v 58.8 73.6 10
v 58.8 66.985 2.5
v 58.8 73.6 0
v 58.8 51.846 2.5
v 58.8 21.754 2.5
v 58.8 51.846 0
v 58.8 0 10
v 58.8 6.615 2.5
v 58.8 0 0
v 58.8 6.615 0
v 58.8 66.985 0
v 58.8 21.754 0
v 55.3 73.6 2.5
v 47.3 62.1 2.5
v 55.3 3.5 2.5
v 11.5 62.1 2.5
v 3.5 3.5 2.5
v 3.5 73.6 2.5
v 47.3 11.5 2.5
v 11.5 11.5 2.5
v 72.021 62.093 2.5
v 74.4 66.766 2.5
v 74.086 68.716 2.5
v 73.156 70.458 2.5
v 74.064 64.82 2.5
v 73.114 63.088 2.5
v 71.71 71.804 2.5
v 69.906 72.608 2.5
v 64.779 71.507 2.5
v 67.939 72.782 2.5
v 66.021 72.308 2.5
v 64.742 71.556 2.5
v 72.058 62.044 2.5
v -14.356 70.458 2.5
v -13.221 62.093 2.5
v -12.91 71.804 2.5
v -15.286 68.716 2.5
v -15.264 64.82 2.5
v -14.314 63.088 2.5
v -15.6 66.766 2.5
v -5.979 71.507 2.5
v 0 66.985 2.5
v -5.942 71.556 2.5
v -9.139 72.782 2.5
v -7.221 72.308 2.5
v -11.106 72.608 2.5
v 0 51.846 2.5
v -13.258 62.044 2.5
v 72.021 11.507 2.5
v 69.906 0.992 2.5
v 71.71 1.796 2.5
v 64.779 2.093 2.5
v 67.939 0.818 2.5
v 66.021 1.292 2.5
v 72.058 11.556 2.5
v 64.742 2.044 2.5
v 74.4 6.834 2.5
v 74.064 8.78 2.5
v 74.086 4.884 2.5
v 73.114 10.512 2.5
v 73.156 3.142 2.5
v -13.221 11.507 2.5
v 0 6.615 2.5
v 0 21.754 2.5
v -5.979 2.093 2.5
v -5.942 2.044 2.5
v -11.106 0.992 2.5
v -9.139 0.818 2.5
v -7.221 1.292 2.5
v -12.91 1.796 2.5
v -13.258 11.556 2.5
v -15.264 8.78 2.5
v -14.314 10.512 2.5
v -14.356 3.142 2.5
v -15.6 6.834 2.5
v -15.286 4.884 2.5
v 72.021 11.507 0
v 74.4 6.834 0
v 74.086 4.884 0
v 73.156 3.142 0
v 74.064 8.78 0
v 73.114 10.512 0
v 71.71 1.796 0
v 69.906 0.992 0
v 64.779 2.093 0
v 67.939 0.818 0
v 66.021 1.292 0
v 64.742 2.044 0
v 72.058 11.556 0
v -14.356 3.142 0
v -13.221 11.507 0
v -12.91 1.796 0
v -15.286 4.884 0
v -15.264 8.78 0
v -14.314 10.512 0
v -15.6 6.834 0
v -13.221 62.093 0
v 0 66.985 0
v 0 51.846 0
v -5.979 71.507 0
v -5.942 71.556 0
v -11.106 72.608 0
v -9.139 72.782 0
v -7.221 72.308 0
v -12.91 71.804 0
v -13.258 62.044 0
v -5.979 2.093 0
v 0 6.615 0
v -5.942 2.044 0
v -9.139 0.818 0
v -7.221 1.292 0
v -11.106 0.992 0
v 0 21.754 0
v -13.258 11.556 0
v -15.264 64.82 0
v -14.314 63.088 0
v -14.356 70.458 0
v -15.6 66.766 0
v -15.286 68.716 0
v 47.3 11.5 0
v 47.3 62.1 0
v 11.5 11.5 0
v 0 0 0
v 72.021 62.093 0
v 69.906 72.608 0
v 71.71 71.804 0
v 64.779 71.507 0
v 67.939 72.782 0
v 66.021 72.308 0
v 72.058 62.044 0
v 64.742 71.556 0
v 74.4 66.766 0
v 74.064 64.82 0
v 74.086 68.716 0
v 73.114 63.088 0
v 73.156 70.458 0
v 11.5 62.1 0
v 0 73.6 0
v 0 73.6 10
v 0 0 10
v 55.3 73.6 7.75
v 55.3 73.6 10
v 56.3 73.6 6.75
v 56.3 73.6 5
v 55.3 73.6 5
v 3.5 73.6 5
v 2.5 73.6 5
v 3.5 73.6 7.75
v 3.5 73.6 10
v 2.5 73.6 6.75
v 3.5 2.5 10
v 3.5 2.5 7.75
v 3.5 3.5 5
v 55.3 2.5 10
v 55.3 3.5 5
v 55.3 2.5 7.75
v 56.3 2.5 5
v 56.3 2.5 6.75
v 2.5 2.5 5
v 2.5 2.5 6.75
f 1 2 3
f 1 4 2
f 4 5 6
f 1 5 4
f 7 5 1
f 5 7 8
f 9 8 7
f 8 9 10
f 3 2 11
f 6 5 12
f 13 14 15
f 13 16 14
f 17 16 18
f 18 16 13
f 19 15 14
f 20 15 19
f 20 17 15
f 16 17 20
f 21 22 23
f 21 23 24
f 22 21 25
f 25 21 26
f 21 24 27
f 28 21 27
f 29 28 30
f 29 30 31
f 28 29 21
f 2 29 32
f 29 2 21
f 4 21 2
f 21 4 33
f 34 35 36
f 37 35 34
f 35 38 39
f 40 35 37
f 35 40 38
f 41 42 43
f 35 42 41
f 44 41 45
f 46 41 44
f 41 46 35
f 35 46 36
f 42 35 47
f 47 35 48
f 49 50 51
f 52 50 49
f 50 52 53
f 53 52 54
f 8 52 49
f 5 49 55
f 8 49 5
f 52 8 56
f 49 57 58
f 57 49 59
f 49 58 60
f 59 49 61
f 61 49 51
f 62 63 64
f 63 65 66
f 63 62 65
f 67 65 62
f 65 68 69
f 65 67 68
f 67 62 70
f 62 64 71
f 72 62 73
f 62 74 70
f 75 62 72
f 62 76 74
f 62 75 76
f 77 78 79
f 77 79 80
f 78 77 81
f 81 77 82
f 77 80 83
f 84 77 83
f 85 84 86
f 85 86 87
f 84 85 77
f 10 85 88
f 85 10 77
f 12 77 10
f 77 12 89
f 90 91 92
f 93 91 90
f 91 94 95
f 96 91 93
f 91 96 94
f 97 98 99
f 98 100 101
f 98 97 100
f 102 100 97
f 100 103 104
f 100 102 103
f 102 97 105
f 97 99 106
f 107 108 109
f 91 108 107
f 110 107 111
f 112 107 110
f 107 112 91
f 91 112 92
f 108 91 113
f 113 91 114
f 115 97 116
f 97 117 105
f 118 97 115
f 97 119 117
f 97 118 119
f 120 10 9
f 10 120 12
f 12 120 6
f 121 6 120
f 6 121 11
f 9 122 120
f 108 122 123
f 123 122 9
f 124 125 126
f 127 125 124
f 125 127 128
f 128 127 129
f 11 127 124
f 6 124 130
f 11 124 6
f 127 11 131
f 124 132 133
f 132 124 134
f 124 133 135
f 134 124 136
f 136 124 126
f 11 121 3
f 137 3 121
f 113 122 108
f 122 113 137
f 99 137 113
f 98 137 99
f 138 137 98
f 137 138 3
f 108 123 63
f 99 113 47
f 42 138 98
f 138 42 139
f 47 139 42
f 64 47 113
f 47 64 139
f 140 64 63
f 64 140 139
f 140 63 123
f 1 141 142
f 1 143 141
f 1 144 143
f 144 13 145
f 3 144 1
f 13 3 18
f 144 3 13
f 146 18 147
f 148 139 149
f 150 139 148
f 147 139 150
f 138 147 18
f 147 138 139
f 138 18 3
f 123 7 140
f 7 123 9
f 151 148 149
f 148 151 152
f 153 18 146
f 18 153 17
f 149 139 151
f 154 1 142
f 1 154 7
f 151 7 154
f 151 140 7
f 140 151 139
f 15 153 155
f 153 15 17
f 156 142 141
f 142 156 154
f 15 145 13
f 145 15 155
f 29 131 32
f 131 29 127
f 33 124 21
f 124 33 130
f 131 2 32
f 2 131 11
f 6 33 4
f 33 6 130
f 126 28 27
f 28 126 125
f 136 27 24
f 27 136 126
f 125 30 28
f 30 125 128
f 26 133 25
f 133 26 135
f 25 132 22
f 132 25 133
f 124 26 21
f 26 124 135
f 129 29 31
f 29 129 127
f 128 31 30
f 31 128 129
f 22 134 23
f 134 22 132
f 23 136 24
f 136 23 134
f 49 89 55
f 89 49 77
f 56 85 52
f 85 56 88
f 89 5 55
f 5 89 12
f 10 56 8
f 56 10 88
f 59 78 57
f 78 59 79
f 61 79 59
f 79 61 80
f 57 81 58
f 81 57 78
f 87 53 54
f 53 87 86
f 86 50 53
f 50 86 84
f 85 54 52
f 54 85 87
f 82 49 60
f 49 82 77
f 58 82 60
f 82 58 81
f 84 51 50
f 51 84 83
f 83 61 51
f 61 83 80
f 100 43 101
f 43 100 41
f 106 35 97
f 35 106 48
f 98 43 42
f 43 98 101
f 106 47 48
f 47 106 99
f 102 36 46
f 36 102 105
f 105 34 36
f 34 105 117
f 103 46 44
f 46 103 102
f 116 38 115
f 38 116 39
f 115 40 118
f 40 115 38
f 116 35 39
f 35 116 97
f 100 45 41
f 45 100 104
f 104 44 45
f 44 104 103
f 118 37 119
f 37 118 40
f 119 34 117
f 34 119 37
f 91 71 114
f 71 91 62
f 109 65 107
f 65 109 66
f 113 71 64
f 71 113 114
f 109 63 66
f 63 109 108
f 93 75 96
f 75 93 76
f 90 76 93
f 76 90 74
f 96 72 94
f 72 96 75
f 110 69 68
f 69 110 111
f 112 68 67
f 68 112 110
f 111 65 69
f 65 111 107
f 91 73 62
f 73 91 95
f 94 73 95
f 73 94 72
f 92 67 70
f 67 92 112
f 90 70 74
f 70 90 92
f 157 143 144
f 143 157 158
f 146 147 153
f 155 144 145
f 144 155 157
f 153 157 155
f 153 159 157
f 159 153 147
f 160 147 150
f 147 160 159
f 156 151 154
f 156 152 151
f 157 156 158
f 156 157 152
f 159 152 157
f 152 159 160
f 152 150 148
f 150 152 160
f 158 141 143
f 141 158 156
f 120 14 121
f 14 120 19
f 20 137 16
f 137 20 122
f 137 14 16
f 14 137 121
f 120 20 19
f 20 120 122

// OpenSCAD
/* pcb_box_slide_with_tabs.scad
 * By Nicholas C Lewis - Jan 1, 2011
 * http://www.thingiverse.com/thing:5396 
 *
 * derived from pcb_box_slide.scad 
 *     Parametric, open PCB-box (slide-in) by chlunde
 *     http://www.thingiverse.com/thing:4071
 *
 * CHANGES
 * - adjusted to fit Arduino Mega
 * - added mounting tabs
 * - turned off cutouts
 * - adjusted bottom cutout size
 */

// Makergear Makerbot Stepper Driver is 57 x 57
// Round up to 57.5 x 57.5
pcb_width = 53.8;
pcb_length =68.6;
pcb_height =1.75;
slisse = 1;

pcb_bottom_margin = 2.5;
wall_width_thick = 3.5;
wall_width = wall_width_thick-slisse;
box_height = 10;

// Tab and Mounting Parameters
tab_hole_radius=0;
tab_outer_radius=12/2;
tab_mount_width = 78;		// X - center to center of mounting hole
tab_mount_length = 60;		// Y - center to center of mounting hole



module tab() {
	difference(){
		union() {
			translate([-tab_outer_radius,-tab_outer_radius,0])
			cube([tab_outer_radius,2*tab_outer_radius,wall_width]);
			translate([-tab_outer_radius,0,0])
				cylinder(r=tab_outer_radius, h = wall_width);
		}
		translate([-tab_outer_radius,0,0])
		cylinder(r= tab_hole_radius, h = wall_width+3,center=true);
	}

}

module JDtab(X, Y) {
	rotate(atan(Y / X), [0,0,1])
	difference(){
		union() {
			translate([0,-tab_outer_radius,0])
			cube([sqrt(X*X+Y*Y),2*tab_outer_radius,wall_width]);
			translate([sqrt(X*X+Y*Y),0,0])
				cylinder(r=tab_outer_radius, h = wall_width);
		}
		translate([sqrt(X*X+Y*Y),0,0])
		cylinder(r= tab_hole_radius, h = wall_width+3,center=true);
	}

}

module box() {
  union() {
    cube([pcb_width + 2*wall_width, pcb_length + 2*wall_width, wall_width]);

    cube([wall_width_thick, pcb_length + 2*wall_width, box_height]);

    cube([pcb_width + 2*wall_width, wall_width_thick, box_height]);

    %translate([0, pcb_length+wall_width, 0])
      cube([pcb_width + 2*wall_width,wall_width,box_height]);
    translate([pcb_width + wall_width - slisse,0,0])
      cube([wall_width_thick, pcb_length + 2*wall_width, box_height]);
  }

// ORIGINAL Tabs
//comment out this part to remove tabs
// for(i=[5,(pcb_length + 2*wall_width)/2,pcb_length + 2*wall_width-5]){
//	translate([0,i,0])tab();
//	translate([pcb_width + 2*wall_width,i,0])mirror()tab();
// }

// JamesDavid's Tabs
  translate([(pcb_width + 2*wall_width)/2, (pcb_length + 2*wall_width)/2, 0]) {

// If you want tabs on the Left leave uncommented
   JDtab(tab_mount_width/2, tab_mount_length/2);
   JDtab(-tab_mount_width/2, tab_mount_length/2);

// If you want tabs on the Right leave uncommented
   mirror()JDtab(tab_mount_width/2, tab_mount_length/2);
   mirror()JDtab(-tab_mount_width/2, tab_mount_length/2);
  }
}

module pcb() {
  translate([wall_width, wall_width, wall_width + pcb_bottom_margin])
    cube([pcb_width,pcb_length + wall_width + 0.1,pcb_height]);
  translate([wall_width, wall_width, wall_width + pcb_bottom_margin+pcb_height])rotate([0,45,0])
    cube([pcb_height,pcb_length + wall_width + 0.1,pcb_height]);
  translate([wall_width+pcb_width-2*cos(45)*pcb_height, wall_width, wall_width + pcb_bottom_margin+pcb_height])rotate([0,45,0])
    cube([pcb_height,pcb_length + wall_width + 0.1,pcb_height]);
  translate([wall_width_thick, wall_width, wall_width + pcb_bottom_margin])
    cube([pcb_width-2*slisse,pcb_length + wall_width + 0.1,box_height]);

}



module holes() {
  *translate([wall_width + pcb_width/2, wall_width_thick + 0.1, pcb_width/2+wall_width])
    rotate(a=90,v=[1,0,0])
      cylinder(r=pcb_width/2, h=wall_width_thick + 0.2);

  *translate([-0.1, wall_width + pcb_length/2, pcb_length/2 + wall_width])
    rotate(a=90,v=[0,1,0])
      cylinder(r=pcb_length/2, h=wall_width_thick + 0.2);

  *translate([pcb_width + wall_width - slisse - 0.1, wall_width + pcb_length/2, pcb_length/2 + wall_width])
    rotate(a=90,v=[0,1,0])
      cylinder(r=pcb_length/2, h=wall_width_thick + 0.2);

 * translate([pcb_width/2 + wall_width, wall_width + pcb_length/2, -0.1])
    rotate(a=0,v=[0,1,0])
      cylinder(r=min(pcb_length,pcb_width)/2 - wall_width/2, h=wall_width_thick + 0.2);
   
  inner_margin = 9;
  translate([inner_margin +wall_width, inner_margin+wall_width, -0.1])
    cube([pcb_width-inner_margin*2,pcb_length -inner_margin*2,wall_width + 0.2]);
}

difference() {
 box();
 pcb();
 holes();
//  JDtab(tab_mount_width/2, tab_mount_length/2);

}

* color([1,0,0])
  translate([pcb_width/2 + wall_width, wall_width + pcb_length/2, -0.1])
    rotate(a=0,v=[0,1,0])
      cylinder(r=min(pcb_length,pcb_width)/2 - wall_width/2, h=wall_width_thick + 0.2);
